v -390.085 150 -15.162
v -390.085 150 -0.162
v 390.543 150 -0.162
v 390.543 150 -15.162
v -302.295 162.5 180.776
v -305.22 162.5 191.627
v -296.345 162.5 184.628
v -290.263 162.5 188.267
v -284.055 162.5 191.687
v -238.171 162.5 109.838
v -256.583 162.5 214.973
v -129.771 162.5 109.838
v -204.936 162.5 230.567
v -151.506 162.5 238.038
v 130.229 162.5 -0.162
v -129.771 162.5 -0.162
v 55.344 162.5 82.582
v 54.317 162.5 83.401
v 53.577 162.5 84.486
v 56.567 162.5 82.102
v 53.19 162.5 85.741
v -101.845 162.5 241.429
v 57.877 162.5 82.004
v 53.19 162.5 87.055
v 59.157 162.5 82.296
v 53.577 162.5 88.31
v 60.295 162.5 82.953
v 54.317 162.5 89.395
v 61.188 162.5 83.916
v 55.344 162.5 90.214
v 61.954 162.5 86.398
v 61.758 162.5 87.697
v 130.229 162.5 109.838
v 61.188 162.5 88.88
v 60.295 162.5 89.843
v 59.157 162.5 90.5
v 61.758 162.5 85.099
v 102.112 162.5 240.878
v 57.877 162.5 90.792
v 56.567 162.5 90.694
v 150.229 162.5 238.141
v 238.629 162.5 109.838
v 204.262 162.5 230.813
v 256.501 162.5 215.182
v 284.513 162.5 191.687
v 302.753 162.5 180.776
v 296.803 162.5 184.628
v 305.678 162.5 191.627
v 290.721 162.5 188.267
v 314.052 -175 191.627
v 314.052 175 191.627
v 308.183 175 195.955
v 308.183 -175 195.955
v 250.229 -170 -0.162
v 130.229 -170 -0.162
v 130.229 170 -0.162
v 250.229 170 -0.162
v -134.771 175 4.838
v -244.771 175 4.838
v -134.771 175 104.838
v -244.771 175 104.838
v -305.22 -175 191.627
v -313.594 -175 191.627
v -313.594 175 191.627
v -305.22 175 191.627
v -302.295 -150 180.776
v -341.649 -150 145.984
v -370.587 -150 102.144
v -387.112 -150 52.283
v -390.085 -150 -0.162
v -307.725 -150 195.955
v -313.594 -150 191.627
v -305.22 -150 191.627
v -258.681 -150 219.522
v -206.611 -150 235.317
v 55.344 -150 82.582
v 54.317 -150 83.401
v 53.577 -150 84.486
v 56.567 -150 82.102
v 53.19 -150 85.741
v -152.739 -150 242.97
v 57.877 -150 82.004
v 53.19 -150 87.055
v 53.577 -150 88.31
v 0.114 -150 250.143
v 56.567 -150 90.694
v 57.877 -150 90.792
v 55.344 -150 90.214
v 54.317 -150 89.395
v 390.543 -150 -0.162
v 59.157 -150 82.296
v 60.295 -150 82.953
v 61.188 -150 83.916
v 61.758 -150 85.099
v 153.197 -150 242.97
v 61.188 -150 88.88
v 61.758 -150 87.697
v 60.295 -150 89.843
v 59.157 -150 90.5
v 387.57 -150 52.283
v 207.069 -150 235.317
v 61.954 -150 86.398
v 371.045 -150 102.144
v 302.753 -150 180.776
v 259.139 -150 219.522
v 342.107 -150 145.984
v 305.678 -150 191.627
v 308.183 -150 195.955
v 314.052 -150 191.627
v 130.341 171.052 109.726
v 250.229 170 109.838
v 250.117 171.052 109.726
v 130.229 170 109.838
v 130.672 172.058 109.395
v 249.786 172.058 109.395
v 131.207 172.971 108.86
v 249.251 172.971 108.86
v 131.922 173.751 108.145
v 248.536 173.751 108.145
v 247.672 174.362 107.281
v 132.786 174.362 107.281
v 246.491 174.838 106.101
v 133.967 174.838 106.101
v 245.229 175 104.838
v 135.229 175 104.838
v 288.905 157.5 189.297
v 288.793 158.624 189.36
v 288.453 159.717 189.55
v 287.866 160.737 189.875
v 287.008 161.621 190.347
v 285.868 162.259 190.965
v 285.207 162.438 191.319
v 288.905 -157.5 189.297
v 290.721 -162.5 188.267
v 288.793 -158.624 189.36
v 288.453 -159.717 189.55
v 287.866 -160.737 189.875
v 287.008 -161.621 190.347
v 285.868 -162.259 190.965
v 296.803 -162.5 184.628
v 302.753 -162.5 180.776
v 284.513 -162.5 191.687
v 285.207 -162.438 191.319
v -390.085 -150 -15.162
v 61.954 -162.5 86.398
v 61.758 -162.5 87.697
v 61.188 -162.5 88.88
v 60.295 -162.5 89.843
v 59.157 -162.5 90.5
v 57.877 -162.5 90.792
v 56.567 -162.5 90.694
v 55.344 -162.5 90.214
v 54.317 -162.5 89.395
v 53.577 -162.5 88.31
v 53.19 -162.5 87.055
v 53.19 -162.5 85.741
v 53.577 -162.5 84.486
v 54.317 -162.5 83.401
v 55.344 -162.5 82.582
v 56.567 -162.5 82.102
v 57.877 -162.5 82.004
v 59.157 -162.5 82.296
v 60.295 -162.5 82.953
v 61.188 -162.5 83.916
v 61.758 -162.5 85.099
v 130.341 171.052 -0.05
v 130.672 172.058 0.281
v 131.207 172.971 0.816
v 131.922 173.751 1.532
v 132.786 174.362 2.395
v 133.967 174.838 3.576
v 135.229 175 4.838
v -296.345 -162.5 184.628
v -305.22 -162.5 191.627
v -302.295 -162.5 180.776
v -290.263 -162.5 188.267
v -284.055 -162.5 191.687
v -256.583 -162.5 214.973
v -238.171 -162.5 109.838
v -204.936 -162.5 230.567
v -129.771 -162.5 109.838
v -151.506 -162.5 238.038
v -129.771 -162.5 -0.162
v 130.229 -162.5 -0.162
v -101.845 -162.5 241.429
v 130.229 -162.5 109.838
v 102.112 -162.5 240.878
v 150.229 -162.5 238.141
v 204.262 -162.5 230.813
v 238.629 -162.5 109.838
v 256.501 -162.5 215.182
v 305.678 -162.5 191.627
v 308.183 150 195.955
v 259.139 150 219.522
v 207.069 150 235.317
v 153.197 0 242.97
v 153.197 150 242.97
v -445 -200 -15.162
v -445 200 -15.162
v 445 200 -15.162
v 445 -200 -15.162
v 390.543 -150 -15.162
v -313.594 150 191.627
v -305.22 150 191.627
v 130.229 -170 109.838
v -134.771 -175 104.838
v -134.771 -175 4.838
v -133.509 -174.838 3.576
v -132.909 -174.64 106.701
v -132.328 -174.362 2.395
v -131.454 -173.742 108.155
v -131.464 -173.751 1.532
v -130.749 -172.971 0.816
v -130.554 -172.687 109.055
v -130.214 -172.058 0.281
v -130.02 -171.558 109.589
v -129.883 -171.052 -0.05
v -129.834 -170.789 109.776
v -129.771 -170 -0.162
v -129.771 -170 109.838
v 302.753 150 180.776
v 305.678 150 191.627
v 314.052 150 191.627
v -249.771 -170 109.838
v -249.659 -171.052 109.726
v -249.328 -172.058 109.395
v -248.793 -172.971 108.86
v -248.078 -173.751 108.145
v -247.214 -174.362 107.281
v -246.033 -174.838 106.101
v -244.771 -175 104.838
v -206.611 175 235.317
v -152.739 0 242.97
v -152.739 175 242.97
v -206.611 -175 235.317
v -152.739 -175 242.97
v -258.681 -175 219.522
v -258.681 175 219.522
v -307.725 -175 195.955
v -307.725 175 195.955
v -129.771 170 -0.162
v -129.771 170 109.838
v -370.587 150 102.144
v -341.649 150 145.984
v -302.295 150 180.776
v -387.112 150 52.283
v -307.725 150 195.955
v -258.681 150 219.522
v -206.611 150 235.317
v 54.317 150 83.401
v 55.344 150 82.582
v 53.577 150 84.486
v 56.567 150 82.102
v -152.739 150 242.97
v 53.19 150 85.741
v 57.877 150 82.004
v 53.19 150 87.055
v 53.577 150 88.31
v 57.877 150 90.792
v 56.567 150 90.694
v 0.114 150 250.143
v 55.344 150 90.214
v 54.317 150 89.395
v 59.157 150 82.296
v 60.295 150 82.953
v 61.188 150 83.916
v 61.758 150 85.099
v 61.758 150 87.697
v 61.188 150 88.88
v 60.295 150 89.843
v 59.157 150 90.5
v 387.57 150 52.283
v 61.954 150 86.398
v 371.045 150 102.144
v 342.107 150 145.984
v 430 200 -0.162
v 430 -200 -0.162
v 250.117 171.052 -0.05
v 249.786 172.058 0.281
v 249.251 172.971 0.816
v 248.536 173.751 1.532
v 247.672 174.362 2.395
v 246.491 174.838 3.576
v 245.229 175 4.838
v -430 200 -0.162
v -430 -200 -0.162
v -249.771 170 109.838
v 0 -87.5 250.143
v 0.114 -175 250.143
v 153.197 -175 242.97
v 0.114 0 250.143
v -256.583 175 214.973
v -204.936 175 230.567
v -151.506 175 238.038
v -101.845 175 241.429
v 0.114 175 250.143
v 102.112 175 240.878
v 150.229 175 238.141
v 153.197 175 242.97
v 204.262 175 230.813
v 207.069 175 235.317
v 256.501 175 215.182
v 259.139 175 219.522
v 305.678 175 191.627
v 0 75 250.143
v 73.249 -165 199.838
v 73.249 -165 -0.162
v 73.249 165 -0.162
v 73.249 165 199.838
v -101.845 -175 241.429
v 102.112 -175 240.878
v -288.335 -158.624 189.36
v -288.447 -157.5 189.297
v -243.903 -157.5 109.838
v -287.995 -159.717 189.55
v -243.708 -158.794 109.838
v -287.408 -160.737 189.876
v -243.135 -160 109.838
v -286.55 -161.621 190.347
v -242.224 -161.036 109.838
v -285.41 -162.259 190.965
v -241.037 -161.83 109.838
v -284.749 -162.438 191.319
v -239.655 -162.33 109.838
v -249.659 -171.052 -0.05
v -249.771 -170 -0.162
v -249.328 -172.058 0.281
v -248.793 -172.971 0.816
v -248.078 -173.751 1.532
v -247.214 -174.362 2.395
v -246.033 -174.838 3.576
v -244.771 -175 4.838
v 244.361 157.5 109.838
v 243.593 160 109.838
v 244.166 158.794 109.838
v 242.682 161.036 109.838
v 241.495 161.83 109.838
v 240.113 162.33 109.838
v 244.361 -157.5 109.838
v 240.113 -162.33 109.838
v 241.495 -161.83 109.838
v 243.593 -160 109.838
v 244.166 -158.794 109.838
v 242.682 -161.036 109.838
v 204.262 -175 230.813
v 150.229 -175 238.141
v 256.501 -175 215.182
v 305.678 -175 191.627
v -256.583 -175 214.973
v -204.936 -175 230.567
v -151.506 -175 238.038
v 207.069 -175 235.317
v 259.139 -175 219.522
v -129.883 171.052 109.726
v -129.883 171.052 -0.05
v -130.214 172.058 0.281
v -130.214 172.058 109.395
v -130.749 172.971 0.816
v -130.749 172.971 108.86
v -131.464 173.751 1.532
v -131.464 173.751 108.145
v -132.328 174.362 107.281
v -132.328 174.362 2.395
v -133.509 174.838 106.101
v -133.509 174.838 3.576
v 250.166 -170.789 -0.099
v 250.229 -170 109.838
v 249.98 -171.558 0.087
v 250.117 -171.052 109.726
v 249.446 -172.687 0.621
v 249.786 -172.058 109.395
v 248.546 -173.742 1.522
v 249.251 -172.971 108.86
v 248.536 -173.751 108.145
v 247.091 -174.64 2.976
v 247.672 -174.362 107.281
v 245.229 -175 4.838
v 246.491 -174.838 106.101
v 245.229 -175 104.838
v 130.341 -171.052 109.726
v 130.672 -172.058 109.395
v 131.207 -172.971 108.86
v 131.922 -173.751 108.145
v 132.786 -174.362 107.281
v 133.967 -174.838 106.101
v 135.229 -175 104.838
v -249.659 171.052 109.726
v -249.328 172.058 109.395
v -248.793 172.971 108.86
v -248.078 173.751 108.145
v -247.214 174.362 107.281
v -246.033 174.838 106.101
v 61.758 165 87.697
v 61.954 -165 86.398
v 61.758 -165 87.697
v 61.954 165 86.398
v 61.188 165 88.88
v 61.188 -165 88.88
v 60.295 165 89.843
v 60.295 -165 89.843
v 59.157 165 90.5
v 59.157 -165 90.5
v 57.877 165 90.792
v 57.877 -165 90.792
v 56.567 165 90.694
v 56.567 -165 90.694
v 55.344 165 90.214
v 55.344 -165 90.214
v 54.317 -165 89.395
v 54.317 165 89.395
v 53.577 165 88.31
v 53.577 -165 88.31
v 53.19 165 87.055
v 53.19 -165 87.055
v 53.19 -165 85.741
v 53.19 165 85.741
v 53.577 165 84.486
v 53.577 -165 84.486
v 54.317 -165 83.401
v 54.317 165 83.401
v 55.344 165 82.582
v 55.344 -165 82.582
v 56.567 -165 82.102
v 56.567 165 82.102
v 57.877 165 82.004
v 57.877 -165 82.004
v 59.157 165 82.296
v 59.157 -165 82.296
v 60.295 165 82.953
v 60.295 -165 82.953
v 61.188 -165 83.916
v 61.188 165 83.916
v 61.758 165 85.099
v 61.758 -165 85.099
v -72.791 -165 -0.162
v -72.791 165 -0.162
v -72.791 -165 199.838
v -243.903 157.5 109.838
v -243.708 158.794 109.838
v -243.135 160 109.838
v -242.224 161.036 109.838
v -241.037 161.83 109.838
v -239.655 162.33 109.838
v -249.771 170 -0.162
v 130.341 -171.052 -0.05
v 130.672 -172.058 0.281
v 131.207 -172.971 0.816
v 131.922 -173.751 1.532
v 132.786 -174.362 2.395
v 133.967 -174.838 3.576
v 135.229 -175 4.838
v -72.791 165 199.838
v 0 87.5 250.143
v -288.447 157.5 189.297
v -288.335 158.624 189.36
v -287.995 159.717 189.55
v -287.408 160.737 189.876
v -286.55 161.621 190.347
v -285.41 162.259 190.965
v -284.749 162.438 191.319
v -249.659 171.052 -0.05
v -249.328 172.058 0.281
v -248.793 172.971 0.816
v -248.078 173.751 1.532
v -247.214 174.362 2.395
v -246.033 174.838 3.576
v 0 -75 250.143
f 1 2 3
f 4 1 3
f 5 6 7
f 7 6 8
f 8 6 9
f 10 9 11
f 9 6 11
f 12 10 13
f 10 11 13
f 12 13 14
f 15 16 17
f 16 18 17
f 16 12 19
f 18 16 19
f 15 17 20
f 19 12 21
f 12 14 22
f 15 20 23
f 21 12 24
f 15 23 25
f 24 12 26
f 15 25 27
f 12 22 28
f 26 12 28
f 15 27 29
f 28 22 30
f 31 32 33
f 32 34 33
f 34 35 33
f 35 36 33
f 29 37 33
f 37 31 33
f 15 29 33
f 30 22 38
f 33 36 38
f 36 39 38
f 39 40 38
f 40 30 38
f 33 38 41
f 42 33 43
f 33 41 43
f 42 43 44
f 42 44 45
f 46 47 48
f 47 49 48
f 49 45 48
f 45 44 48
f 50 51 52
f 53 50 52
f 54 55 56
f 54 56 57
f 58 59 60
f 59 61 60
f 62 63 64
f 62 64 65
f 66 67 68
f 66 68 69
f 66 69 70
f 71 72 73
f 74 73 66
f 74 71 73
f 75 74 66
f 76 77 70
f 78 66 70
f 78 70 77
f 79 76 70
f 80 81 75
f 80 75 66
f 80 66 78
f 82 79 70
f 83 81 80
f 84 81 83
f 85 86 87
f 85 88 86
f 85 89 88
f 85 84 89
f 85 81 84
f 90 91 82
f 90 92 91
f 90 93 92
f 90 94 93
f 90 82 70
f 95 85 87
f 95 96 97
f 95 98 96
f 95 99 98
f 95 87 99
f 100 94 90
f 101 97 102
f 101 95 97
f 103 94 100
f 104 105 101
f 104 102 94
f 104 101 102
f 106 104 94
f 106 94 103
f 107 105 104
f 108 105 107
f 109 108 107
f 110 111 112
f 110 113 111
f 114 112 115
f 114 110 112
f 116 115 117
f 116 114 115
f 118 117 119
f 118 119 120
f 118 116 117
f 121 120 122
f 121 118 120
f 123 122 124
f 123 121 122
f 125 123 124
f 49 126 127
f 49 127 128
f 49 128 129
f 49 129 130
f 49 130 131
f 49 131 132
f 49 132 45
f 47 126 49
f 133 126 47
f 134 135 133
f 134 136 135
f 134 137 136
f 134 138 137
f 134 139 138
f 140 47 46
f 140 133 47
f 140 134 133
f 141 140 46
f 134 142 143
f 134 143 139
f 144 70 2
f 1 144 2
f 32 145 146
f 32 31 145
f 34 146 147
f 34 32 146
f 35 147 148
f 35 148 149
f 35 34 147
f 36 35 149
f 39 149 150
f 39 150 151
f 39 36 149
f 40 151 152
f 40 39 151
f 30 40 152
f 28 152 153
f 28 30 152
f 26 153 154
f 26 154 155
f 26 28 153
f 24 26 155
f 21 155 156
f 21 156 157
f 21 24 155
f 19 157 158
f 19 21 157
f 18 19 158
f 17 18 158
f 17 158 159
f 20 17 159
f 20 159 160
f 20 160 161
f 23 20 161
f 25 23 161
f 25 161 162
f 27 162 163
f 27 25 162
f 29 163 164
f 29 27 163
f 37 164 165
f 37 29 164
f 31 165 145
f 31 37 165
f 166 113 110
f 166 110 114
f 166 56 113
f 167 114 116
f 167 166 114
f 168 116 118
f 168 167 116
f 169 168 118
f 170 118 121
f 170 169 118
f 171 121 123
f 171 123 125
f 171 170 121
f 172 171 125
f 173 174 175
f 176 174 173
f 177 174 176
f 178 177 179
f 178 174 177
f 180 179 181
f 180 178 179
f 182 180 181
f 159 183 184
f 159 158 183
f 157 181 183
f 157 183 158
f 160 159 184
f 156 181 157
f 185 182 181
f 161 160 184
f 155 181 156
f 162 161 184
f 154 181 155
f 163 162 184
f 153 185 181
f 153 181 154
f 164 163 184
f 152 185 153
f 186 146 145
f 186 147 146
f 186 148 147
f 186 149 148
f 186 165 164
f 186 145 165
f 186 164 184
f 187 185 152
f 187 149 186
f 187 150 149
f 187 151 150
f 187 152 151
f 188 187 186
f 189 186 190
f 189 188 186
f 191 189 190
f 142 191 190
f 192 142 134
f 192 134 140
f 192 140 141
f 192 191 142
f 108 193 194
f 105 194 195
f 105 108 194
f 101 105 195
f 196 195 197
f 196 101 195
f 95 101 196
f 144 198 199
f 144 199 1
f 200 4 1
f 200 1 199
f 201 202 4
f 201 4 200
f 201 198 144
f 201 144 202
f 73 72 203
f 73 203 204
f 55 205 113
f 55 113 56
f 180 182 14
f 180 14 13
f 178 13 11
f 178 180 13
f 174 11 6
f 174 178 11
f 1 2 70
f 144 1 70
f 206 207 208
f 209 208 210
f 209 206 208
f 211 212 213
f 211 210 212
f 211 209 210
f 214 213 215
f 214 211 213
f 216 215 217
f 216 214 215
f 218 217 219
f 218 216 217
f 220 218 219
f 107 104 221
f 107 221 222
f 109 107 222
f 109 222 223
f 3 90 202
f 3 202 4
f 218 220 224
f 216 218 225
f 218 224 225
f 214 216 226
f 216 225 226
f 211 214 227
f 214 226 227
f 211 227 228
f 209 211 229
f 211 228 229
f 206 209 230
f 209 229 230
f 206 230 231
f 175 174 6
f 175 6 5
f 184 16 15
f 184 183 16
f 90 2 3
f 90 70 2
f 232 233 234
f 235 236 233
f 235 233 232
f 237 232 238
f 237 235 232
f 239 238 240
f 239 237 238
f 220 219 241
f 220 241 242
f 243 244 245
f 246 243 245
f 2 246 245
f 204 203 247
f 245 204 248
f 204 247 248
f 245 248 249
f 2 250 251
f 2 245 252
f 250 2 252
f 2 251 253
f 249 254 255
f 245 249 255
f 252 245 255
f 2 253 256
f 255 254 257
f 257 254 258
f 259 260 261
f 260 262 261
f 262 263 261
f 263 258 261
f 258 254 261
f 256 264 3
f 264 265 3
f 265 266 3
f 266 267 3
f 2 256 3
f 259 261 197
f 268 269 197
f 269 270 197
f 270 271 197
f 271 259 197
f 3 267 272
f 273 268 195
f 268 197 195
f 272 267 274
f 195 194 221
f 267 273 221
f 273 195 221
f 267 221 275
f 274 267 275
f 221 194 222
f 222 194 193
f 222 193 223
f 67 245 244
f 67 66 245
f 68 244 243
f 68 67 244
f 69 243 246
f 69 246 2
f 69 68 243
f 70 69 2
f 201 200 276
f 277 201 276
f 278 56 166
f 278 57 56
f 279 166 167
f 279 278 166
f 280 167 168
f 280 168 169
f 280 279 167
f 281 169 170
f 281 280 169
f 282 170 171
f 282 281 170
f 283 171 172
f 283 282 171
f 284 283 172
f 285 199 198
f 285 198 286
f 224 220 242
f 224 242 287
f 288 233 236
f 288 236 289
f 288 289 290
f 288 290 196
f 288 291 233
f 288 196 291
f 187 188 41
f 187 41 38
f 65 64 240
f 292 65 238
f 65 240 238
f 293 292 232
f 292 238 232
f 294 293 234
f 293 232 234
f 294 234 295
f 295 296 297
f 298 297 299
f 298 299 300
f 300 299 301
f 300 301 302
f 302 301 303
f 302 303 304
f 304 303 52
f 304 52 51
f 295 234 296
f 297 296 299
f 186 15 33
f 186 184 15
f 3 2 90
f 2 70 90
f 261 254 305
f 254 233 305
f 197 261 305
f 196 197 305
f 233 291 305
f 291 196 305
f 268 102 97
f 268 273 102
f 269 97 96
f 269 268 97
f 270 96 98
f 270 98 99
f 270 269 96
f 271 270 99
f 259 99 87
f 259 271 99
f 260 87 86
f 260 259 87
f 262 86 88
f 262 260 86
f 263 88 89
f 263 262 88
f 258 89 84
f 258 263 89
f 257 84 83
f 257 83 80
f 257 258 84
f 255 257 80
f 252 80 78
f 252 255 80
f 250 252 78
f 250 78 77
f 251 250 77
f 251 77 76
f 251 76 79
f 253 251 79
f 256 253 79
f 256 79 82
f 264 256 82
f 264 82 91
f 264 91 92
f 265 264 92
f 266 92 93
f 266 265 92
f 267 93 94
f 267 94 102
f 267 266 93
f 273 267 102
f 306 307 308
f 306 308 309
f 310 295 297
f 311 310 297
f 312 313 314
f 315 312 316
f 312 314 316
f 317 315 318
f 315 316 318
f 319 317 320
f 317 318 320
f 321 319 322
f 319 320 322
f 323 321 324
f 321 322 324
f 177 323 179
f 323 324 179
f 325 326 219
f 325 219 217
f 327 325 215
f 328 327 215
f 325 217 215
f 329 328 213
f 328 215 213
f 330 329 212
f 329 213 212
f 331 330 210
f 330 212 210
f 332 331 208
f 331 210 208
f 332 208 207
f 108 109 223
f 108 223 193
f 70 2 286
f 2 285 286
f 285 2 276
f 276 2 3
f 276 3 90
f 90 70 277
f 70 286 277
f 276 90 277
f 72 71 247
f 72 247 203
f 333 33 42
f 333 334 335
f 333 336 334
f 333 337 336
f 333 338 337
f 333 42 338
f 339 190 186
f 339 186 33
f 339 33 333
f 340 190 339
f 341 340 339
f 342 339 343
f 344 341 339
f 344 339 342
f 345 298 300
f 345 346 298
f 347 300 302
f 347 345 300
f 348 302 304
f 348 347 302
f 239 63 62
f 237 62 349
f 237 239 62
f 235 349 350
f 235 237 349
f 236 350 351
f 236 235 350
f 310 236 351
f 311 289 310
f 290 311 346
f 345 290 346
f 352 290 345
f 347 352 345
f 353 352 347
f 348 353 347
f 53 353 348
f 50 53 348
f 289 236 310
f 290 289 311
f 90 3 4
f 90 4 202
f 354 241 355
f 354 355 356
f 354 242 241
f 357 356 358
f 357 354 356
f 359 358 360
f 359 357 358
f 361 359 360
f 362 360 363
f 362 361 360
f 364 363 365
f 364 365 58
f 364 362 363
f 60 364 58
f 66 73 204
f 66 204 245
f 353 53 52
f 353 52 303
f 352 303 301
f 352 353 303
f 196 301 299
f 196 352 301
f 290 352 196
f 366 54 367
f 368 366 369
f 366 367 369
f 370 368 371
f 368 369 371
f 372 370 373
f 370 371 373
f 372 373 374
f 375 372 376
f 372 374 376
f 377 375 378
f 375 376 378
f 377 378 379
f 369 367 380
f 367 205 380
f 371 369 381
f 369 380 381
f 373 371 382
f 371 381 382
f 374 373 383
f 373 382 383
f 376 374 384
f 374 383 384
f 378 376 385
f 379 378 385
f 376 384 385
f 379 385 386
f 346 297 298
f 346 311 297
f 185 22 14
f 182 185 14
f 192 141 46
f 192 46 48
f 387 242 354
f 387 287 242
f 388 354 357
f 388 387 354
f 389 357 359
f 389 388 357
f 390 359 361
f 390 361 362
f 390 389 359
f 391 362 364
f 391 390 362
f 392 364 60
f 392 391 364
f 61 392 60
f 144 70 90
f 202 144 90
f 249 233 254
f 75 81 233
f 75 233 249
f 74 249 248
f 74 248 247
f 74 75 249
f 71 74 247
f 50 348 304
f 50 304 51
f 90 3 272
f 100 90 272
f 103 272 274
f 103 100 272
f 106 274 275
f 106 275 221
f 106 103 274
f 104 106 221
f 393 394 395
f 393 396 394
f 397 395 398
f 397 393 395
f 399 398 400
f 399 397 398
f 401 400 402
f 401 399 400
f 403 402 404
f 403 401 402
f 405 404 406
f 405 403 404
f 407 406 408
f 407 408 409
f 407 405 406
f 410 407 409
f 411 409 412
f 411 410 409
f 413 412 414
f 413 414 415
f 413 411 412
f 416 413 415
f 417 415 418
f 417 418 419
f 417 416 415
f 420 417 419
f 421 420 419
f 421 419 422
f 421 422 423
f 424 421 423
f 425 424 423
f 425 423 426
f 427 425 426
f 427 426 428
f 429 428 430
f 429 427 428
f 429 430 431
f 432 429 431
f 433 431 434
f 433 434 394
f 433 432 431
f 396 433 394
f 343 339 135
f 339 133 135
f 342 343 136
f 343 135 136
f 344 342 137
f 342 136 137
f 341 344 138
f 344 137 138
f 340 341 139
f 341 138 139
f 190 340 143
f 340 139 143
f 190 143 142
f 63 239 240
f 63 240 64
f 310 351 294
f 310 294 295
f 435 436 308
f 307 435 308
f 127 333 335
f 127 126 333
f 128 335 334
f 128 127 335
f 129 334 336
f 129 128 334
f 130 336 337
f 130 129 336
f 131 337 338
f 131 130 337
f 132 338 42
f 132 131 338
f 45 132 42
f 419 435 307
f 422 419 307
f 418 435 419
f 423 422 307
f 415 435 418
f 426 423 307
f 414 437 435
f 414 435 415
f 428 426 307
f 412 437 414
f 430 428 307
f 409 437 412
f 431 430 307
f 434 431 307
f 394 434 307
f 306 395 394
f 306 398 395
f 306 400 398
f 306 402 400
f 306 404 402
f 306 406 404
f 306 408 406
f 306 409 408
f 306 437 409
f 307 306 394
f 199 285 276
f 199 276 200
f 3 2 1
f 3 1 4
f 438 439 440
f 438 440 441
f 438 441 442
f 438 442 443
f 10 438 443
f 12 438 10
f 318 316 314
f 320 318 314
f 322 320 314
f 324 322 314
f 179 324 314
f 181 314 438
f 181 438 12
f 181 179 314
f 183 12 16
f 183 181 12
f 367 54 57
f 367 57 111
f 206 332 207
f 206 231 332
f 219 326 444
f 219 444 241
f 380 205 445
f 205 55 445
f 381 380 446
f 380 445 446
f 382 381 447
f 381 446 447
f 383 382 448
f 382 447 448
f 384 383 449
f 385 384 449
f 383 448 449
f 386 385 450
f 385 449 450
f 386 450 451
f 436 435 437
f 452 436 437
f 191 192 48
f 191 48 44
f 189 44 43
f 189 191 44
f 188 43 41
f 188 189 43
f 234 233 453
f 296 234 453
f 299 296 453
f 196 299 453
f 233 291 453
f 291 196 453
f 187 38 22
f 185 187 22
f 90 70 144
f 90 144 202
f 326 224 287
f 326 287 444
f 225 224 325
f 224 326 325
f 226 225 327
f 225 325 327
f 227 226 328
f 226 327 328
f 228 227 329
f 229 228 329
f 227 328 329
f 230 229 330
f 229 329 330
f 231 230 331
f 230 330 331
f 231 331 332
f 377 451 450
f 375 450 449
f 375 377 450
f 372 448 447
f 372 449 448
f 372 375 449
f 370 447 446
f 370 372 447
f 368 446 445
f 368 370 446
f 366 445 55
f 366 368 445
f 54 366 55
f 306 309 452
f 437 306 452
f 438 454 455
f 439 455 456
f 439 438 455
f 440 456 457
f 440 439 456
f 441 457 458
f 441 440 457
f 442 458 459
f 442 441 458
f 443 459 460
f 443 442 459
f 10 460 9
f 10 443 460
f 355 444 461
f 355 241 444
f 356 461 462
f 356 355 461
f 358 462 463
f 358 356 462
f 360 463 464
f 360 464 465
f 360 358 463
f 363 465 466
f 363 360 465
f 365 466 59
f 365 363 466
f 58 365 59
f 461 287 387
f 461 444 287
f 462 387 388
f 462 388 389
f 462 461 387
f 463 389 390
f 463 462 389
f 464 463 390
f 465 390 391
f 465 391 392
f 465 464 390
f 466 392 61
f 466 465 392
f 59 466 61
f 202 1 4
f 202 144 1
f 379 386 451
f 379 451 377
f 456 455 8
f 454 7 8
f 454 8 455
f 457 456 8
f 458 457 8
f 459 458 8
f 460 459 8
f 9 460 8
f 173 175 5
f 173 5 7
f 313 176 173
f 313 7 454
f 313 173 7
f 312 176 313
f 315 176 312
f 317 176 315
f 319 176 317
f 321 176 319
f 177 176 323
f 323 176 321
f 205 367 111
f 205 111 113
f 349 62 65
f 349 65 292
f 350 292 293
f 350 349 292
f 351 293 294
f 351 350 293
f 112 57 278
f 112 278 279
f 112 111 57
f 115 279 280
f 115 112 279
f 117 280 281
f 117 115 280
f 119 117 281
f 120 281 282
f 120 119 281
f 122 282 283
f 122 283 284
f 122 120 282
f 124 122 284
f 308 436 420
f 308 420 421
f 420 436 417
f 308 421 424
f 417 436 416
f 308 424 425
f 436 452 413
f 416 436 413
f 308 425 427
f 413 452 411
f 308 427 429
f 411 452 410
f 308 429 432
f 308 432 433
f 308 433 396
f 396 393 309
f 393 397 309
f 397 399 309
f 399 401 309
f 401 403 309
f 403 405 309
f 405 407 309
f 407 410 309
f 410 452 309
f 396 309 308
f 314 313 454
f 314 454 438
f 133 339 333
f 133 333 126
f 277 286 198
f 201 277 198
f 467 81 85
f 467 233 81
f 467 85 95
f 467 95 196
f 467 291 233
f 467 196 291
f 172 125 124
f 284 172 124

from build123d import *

# Parameters (mm, degrees)
F0_W        = 73.01958814
F0_H        = 200
F0_R        = 4.4064886868
F1_DEPTH    = 150
F2_DEPTH    = 175
F3_DEPTH    = 175
F4_DEPTH    = 162.5
F5_DEPTH    = 165
F6_R        = 5
F6_2_R      = 5
F6_3_R      = 5
F7_W        = 900
F7_H        = 400
F7_W_2      = 780.6288967379
F7_H_2      = 300
F8_DEPTH    = 15
F9_T1_DEPTH = 502.8673195186
F10_DEPTH   = 15


# Not quite as in the source:
# - a fillet or chamfer that OpenCascade refuses, or shapes differently, is made with other operations: its cross-section is extruded or revolved along the edge and cut away or added
# - ends of sketch curves that miss each other by under 0.0002 mm in the source are joined


with BuildPart() as f1:
    # F0 (on Front) → F1 (new body, symmetric)
    with BuildSketch(Plane.XZ):
        with BuildLine():
            Line((73.2485631082, 199.8381957412), (73.2485631082, -0.1618042588))
            Line((73.2485631082, -0.1618042588), (130.2289748106, -0.1618042588))
            Line((130.2289748106, -0.1618042588), (130.2289749682, 109.8381957412))
            Line((130.2289749682, 109.8381957412), (244.361110868, 109.8381957412))
            Line((244.361110868, 109.8381957412), (288.9051257209, 189.2969646801))
            ThreePointArc((288.9051257209, 189.2969646801), (295.915659625, 185.1774143178), (302.7529489944, 180.7763059474))
            Line((302.7529489944, 180.7763059474), (305.6783307484, 191.6270836714))
            ThreePointArc((305.6783307484, 191.6270836714), (230.6863223559, 224.0165542057), (150.2289749682, 238.1408019938))
            Line((150.2289749682, 238.1408019938), (102.1122379409, 240.8775282261))
            Line((102.1122379409, 240.8775282261), (-101.8451842253, 241.4292395115))
            Line((-101.8451842253, 241.4292395115), (-151.505661922, 238.0378207475))
            ThreePointArc((-151.505661922, 238.0378207475), (-231.0604446139, 223.7664550341), (-305.220380812, 191.6270836714))
            Line((-305.220380812, 191.6270836714), (-302.294999058, 180.7763059474))
            ThreePointArc((-302.294999058, 180.7763059474), (-295.4577096886, 185.1774143178), (-288.4471757845, 189.2969646801))
            Line((-288.4471757845, 189.2969646801), (-243.9031609316, 109.8381957412))
            Line((-243.9031609316, 109.8381957412), (-129.7710250318, 109.8381957412))
            Line((-129.7710250318, 109.8381957412), (-129.7710250318, -0.1618042588))
            Line((-129.7710250318, -0.1618042588), (-72.7906131718, -0.1618042588))
            Line((-72.7906131718, -0.1618042588), (-72.7906131718, 199.8381957412))
            Line((-72.7906131718, 199.8381957412), (0.2289749682, 199.8381957412))
            Line((0.2289749682, 199.8381957412), (73.2485631082, 199.8381957412))
        make_face()
        Polygon((-249.7710250318, -0.1618042588), (-129.7710250318, -0.1618042588), (-129.7710250318, 109.8381957412), (-243.9031609316, 109.8381957412), (-249.7710250318, 109.8381957412), (-249.7710250318, 46.5387346062), align=None)
        with BuildLine():
            Line((-366.9111720315, 109.3456217277), (-249.7710250318, 46.5387346062))
            Line((-249.7710250318, 46.5387346062), (-249.7710250318, 109.8381957412))
            Line((-249.7710250318, 109.8381957412), (-243.9031609316, 109.8381957412))
            Line((-243.9031609316, 109.8381957412), (-288.4471757845, 189.2969646801))
            ThreePointArc((-288.4471757845, 189.2969646801), (-295.4577096886, 185.1774143178), (-302.294999058, 180.7763059474))
            ThreePointArc((-302.294999058, 180.7763059474), (-338.967392604, 149.0089145388), (-366.9111720315, 109.3456217277))
        make_face()
        with BuildLine():
            Line((-390.0854734008, -0.1618042588), (-249.7710250318, -0.1618042588))
            Line((-249.7710250318, -0.1618042588), (-249.7710250318, 46.5387346062))
            Line((-249.7710250318, 46.5387346062), (-366.9111720315, 109.3456217277))
            ThreePointArc((-366.9111720315, 109.3456217277), (-386.3153062929, 56.2461630608), (-390.0854734008, -0.1618042588))
        make_face()
        with Locations((36.7387690382, 99.8381957412)):
            Rectangle(F0_W, F0_H)
        with Locations((57.5472824275, 86.3982066512)):
            Circle(F0_R, mode=Mode.SUBTRACT)
        with Locations((-36.2808191018, 99.8381957412)):
            Rectangle(F0_W, F0_H)
        with BuildLine():
            Line((288.9051257209, 189.2969646801), (244.361110868, 109.8381957412))
            Line((244.361110868, 109.8381957412), (250.2289749682, 109.8381957412))
            Line((250.2289749682, 109.8381957412), (250.2289749682, 46.5387346062))
            Line((250.2289749682, 46.5387346062), (367.3691219679, 109.3456217277))
            ThreePointArc((367.3691219679, 109.3456217277), (339.4253425404, 149.0089145388), (302.7529489944, 180.7763059474))
            ThreePointArc((302.7529489944, 180.7763059474), (295.915659625, 185.1774143178), (288.9051257209, 189.2969646801))
        make_face()
        with BuildLine():
            Line((250.2289749682, 46.5387346062), (250.2289749682, -0.1618042588))
            Line((250.2289749682, -0.1618042588), (390.5434233372, -0.1618042588))
            ThreePointArc((390.5434233372, -0.1618042588), (386.7732562293, 56.2461630608), (367.3691219679, 109.3456217277))
            Line((367.3691219679, 109.3456217277), (250.2289749682, 46.5387346062))
        make_face()
        with BuildLine():
            Line((130.2289749682, 109.8381957412), (130.2289749682, -0.1618042588))
            Line((130.2289749682, -0.1618042588), (190.2289749682, -0.1618042588))
            Line((190.2289749682, -0.1618042588), (191.104793533, -0.1618042588))
            Line((191.104793533, -0.1618042588), (191.104793533, 2.3381956821))
            ThreePointArc((191.104793533, 2.3381956821), (179.0104848205, 17.996944923), (197.2172556875, 25.7417641993))
            ThreePointArc((197.2172556875, 25.7417641993), (200.0262220751, 23.5936575642), (202.1212084331, 20.7448531759))
            Line((202.1212084331, 20.7448531759), (250.2289749682, 46.5387346062))
            Line((250.2289749682, 46.5387346062), (250.2289749682, 109.8381957412))
            Line((250.2289749682, 109.8381957412), (244.361110868, 109.8381957412))
            Line((244.361110868, 109.8381957412), (130.2289749682, 109.8381957412))
        make_face()
        with BuildLine():
            ThreePointArc((197.2172556875, 25.7417641993), (179.0104848205, 17.996944923), (191.104793533, 2.3381956821))
            Line((191.104793533, 2.3381956821), (191.104793533, 14.8381956821))
            Line((191.104793533, 14.8381956821), (197.2172556875, 25.7417641993))
        make_face()
        with BuildLine():
            ThreePointArc((202.1212084331, 20.7448531759), (200.0262220751, 23.5936575642), (197.2172556875, 25.7417641993))
            Line((197.2172556875, 25.7417641993), (191.104793533, 14.8381956821))
            Line((191.104793533, 14.8381956821), (202.1212084331, 20.7448531759))
        make_face()
        with BuildLine():
            Line((191.104793533, 14.8381956821), (191.104793533, 2.3381956821))
            ThreePointArc((191.104793533, 2.3381956821), (199.9436282978, 5.9993609172), (203.604793533, 14.8381956821))
            ThreePointArc((203.604793533, 14.8381956821), (203.2282251068, 17.8832583866), (202.1212084331, 20.7448531759))
            Line((202.1212084331, 20.7448531759), (191.104793533, 14.8381956821))
        make_face()
        with BuildLine():
            Line((191.104793533, 2.3381956821), (191.104793533, -0.1618043179))
            Line((191.104793533, -0.1618042588), (250.2289749682, -0.1618042588))
            Line((250.2289749682, -0.1618042588), (250.2289749682, 46.5387346062))
            Line((250.2289749682, 46.5387346062), (202.1212084331, 20.7448531759))
            ThreePointArc((202.1212084331, 20.7448531759), (203.2282251068, 17.8832583866), (203.604793533, 14.8381956821))
            ThreePointArc((203.604793533, 14.8381956821), (199.9436282978, 5.9993609172), (191.104793533, 2.3381956821))
        make_face()
        with BuildLine():
            ThreePointArc((150.2289749682, 238.1408019938), (230.6863223559, 224.0165542057), (305.6783307484, 191.6270836714))
            Line((305.6783307484, 191.6270836714), (314.0523768961, 191.6270836714))
            Line((314.0523768961, 191.6270836714), (308.1829609782, 195.9545341232))
            ThreePointArc((308.1829609782, 195.9545341232), (233.4070394956, 228.418836004), (153.1970844362, 242.9698648181))
            add(Edge.make_bspline(
                [(-152.7391344998, 242.9698648181), (-101.8451842253, 246.5544800547), (0.018788196, 253.7290685006), (102.1122379409, 246.5580511475), (153.1970844362, 242.9698648181)],
                knots=[0, 0, 0, 0, 0.4996266007, 1, 1, 1, 1], degree=3))
            ThreePointArc((-152.7391344998, 242.9698648181), (-232.9490895592, 228.418836004), (-307.7250110418, 195.9545341232))
            Line((-307.7250110418, 195.9545341232), (-313.5944269598, 191.6270836714))
            Line((-313.5944269598, 191.6270836714), (-305.220380812, 191.6270836714))
            ThreePointArc((-305.220380812, 191.6270836714), (-231.0604446139, 223.7664550341), (-151.505661922, 238.0378207475))
            Line((-151.505661922, 238.0378207475), (-101.8451842253, 241.4292395115))
            Line((-101.8451842253, 241.4292395115), (102.1122379409, 240.8775282261))
            Line((102.1122379409, 240.8775282261), (150.2289749682, 238.1408019938))
        make_face()
    extrude(amount=F1_DEPTH, both=True)


with BuildPart() as f2:
    # F0 (on Front) → F2 (new body, symmetric)
    with BuildSketch(Plane.XZ):
        with BuildLine():
            ThreePointArc((150.2289749682, 238.1408019938), (230.6863223559, 224.0165542057), (305.6783307484, 191.6270836714))
            Line((305.6783307484, 191.6270836714), (314.0523768961, 191.6270836714))
            Line((314.0523768961, 191.6270836714), (308.1829609782, 195.9545341232))
            ThreePointArc((308.1829609782, 195.9545341232), (233.4070394956, 228.418836004), (153.1970844362, 242.9698648181))
            add(Edge.make_bspline(
                [(-152.7391344998, 242.9698648181), (-101.8451842253, 246.5544800547), (0.018788196, 253.7290685006), (102.1122379409, 246.5580511475), (153.1970844362, 242.9698648181)],
                knots=[0, 0, 0, 0, 0.4996266007, 1, 1, 1, 1], degree=3))
            ThreePointArc((-152.7391344998, 242.9698648181), (-232.9490895592, 228.418836004), (-307.7250110418, 195.9545341232))
            Line((-307.7250110418, 195.9545341232), (-313.5944269598, 191.6270836714))
            Line((-313.5944269598, 191.6270836714), (-305.220380812, 191.6270836714))
            ThreePointArc((-305.220380812, 191.6270836714), (-231.0604446139, 223.7664550341), (-151.505661922, 238.0378207475))
            Line((-151.505661922, 238.0378207475), (-101.8451842253, 241.4292395115))
            Line((-101.8451842253, 241.4292395115), (102.1122379409, 240.8775282261))
            Line((102.1122379409, 240.8775282261), (150.2289749682, 238.1408019938))
        make_face()
    extrude(amount=F2_DEPTH, both=True)


with BuildPart() as f3:
    # F0 (on Front) → F3 (new body, symmetric)
    with BuildSketch(Plane.XZ):
        Polygon((-249.7710250318, -0.1618042588), (-129.7710250318, -0.1618042588), (-129.7710250318, 109.8381957412), (-243.9031609316, 109.8381957412), (-249.7710250318, 109.8381957412), (-249.7710250318, 46.5387346062), align=None)
    extrude(amount=F3_DEPTH, both=True)

    # F6#2
    f6_2_edges = [f3.edges().sort_by_distance(p)[0] for p in [
        (-189.771025, 175, -0.161804),
        (-129.771025, 175, 54.838196),
        (-189.771025, 175, 109.838196),
        (-249.771025, 175, 54.838196),
        (-189.771025, -175, -0.161804),
        (-129.771025, -175, 54.838196),
        (-189.771025, -175, 109.838196),
        (-249.771025, -175, 54.838196),
    ]]
    fillet(f6_2_edges, radius=F6_2_R)


with BuildPart() as f3b:
    # F0 (on Front) → F3, piece 2 (new body, symmetric)
    with BuildSketch(Plane.XZ):
        with BuildLine():
            Line((130.2289749682, 109.8381957412), (130.2289749682, -0.1618042588))
            Line((130.2289749682, -0.1618042588), (190.2289749682, -0.1618042588))
            Line((190.2289749682, -0.1618042588), (191.104793533, -0.1618042588))
            Line((191.104793533, -0.1618042588), (191.104793533, 2.3381956821))
            ThreePointArc((191.104793533, 2.3381956821), (179.0104848205, 17.996944923), (197.2172556875, 25.7417641993))
            ThreePointArc((197.2172556875, 25.7417641993), (200.0262220751, 23.5936575642), (202.1212084331, 20.7448531759))
            Line((202.1212084331, 20.7448531759), (250.2289749682, 46.5387346062))
            Line((250.2289749682, 46.5387346062), (250.2289749682, 109.8381957412))
            Line((250.2289749682, 109.8381957412), (244.361110868, 109.8381957412))
            Line((244.361110868, 109.8381957412), (130.2289749682, 109.8381957412))
        make_face()
        with BuildLine():
            Line((191.104793533, 2.3381956821), (191.104793533, -0.1618043179))
            Line((191.104793533, -0.1618042588), (250.2289749682, -0.1618042588))
            Line((250.2289749682, -0.1618042588), (250.2289749682, 46.5387346062))
            Line((250.2289749682, 46.5387346062), (202.1212084331, 20.7448531759))
            ThreePointArc((202.1212084331, 20.7448531759), (203.2282251068, 17.8832583866), (203.604793533, 14.8381956821))
            ThreePointArc((203.604793533, 14.8381956821), (199.9436282978, 5.9993609172), (191.104793533, 2.3381956821))
        make_face()
        with BuildLine():
            ThreePointArc((197.2172556875, 25.7417641993), (179.0104848205, 17.996944923), (191.104793533, 2.3381956821))
            Line((191.104793533, 2.3381956821), (191.104793533, 14.8381956821))
            Line((191.104793533, 14.8381956821), (197.2172556875, 25.7417641993))
        make_face()
        with BuildLine():
            Line((191.104793533, 14.8381956821), (191.104793533, 2.3381956821))
            ThreePointArc((191.104793533, 2.3381956821), (199.9436282978, 5.9993609172), (203.604793533, 14.8381956821))
            ThreePointArc((203.604793533, 14.8381956821), (203.2282251068, 17.8832583866), (202.1212084331, 20.7448531759))
            Line((202.1212084331, 20.7448531759), (191.104793533, 14.8381956821))
        make_face()
        with BuildLine():
            ThreePointArc((202.1212084331, 20.7448531759), (200.0262220751, 23.5936575642), (197.2172556875, 25.7417641993))
            Line((197.2172556875, 25.7417641993), (191.104793533, 14.8381956821))
            Line((191.104793533, 14.8381956821), (202.1212084331, 20.7448531759))
        make_face()
    extrude(amount=F3_DEPTH, both=True)

    # F6
    f6_edges = [f3b.edges().sort_by_distance(p)[0] for p in [
        (190.228975, 175, 109.838196),
        (130.228975, 175, 54.838196),
        (190.228975, 175, -0.161804),
        (250.228975, 175, 54.838196),
        (190.228975, -175, 109.838196),
        (130.228975, -175, 54.838196),
        (190.228975, -175, -0.161804),
        (250.228975, -175, 54.838196),
    ]]
    fillet(f6_edges, radius=F6_R)


with BuildPart() as f4:
    # F0 (on Front) → F4 (new body, symmetric)
    with BuildSketch(Plane.XZ):
        with Locations((-36.2808191018, 99.8381957412)):
            Rectangle(F0_W, F0_H)
        with Locations((36.7387690382, 99.8381957412)):
            Rectangle(F0_W, F0_H)
        with Locations((57.5472824275, 86.3982066512)):
            Circle(F0_R, mode=Mode.SUBTRACT)
        with BuildLine():
            Line((73.2485631082, 199.8381957412), (73.2485631082, -0.1618042588))
            Line((73.2485631082, -0.1618042588), (130.2289748106, -0.1618042588))
            Line((130.2289748106, -0.1618042588), (130.2289749682, 109.8381957412))
            Line((130.2289749682, 109.8381957412), (244.361110868, 109.8381957412))
            Line((244.361110868, 109.8381957412), (288.9051257209, 189.2969646801))
            ThreePointArc((288.9051257209, 189.2969646801), (295.915659625, 185.1774143178), (302.7529489944, 180.7763059474))
            Line((302.7529489944, 180.7763059474), (305.6783307484, 191.6270836714))
            ThreePointArc((305.6783307484, 191.6270836714), (230.6863223559, 224.0165542057), (150.2289749682, 238.1408019938))
            Line((150.2289749682, 238.1408019938), (102.1122379409, 240.8775282261))
            Line((102.1122379409, 240.8775282261), (-101.8451842253, 241.4292395115))
            Line((-101.8451842253, 241.4292395115), (-151.505661922, 238.0378207475))
            ThreePointArc((-151.505661922, 238.0378207475), (-231.0604446139, 223.7664550341), (-305.220380812, 191.6270836714))
            Line((-305.220380812, 191.6270836714), (-302.294999058, 180.7763059474))
            ThreePointArc((-302.294999058, 180.7763059474), (-295.4577096886, 185.1774143178), (-288.4471757845, 189.2969646801))
            Line((-288.4471757845, 189.2969646801), (-243.9031609316, 109.8381957412))
            Line((-243.9031609316, 109.8381957412), (-129.7710250318, 109.8381957412))
            Line((-129.7710250318, 109.8381957412), (-129.7710250318, -0.1618042588))
            Line((-129.7710250318, -0.1618042588), (-72.7906131718, -0.1618042588))
            Line((-72.7906131718, -0.1618042588), (-72.7906131718, 199.8381957412))
            Line((-72.7906131718, 199.8381957412), (0.2289749682, 199.8381957412))
            Line((0.2289749682, 199.8381957412), (73.2485631082, 199.8381957412))
        make_face()
    extrude(amount=F4_DEPTH, both=True)

    # F6#3
    f6_3_edges = [f4.edges().sort_by_distance(p)[0] for p in [
        (266.633118, 162.5, 149.56758),
        (266.633118, -162.5, 149.56758),
        (-266.175168, -162.5, 149.56758),
        (-266.175168, 162.5, 149.56758),
    ]]
    fillet(f6_3_edges, radius=F6_3_R)


with BuildPart() as f5:
    # F0 (on Front) → F5 (new body, symmetric)
    with BuildSketch(Plane.XZ):
        with Locations((-36.2808191018, 99.8381957412)):
            Rectangle(F0_W, F0_H)
        with Locations((36.7387690382, 99.8381957412)):
            Rectangle(F0_W, F0_H)
        with Locations((57.5472824275, 86.3982066512)):
            Circle(F0_R, mode=Mode.SUBTRACT)
    extrude(amount=F5_DEPTH, both=True)


with BuildPart() as f8:
    # F7 (on face) → F8 (new body)
    with BuildSketch(Plane(origin=(0, 0, -0.1618042588), x_dir=(1, 0, 0), z_dir=(0, 0, -1))):
        Rectangle(F7_W, F7_H)
        with Locations((0.2289749682, 0)):
            Rectangle(F7_W_2, F7_H_2, mode=Mode.SUBTRACT)
    extrude(amount=F8_DEPTH)

    # F9: chamfer of 20 on 2 edges, made by hand

    # F9_s2 → F9_t1 (cut)
    with BuildSketch(Plane.XZ.offset(-251.4336597593)):
        Polygon((450, -20.1618042588), (430, -0.1618042588), (450, -0.1618042588), align=None)
        Polygon((-450, -20.1618042588), (-430, -0.1618042588), (-450, -0.1618042588), align=None)
    extrude(amount=F9_T1_DEPTH, mode=Mode.SUBTRACT)


with BuildPart() as f10:
    # F10 (new): a face of the model
    f10_faces = [f1.part.faces().sort_by_distance(p)[0] for p in [
        (0.2289749682, 0, -0.1618042588),
    ]]
    extrude(f10_faces, amount=F10_DEPTH)


solid = Compound([f1.part, f2.part, f3.part, f3b.part, f4.part, f5.part, f8.part, f10.part])
